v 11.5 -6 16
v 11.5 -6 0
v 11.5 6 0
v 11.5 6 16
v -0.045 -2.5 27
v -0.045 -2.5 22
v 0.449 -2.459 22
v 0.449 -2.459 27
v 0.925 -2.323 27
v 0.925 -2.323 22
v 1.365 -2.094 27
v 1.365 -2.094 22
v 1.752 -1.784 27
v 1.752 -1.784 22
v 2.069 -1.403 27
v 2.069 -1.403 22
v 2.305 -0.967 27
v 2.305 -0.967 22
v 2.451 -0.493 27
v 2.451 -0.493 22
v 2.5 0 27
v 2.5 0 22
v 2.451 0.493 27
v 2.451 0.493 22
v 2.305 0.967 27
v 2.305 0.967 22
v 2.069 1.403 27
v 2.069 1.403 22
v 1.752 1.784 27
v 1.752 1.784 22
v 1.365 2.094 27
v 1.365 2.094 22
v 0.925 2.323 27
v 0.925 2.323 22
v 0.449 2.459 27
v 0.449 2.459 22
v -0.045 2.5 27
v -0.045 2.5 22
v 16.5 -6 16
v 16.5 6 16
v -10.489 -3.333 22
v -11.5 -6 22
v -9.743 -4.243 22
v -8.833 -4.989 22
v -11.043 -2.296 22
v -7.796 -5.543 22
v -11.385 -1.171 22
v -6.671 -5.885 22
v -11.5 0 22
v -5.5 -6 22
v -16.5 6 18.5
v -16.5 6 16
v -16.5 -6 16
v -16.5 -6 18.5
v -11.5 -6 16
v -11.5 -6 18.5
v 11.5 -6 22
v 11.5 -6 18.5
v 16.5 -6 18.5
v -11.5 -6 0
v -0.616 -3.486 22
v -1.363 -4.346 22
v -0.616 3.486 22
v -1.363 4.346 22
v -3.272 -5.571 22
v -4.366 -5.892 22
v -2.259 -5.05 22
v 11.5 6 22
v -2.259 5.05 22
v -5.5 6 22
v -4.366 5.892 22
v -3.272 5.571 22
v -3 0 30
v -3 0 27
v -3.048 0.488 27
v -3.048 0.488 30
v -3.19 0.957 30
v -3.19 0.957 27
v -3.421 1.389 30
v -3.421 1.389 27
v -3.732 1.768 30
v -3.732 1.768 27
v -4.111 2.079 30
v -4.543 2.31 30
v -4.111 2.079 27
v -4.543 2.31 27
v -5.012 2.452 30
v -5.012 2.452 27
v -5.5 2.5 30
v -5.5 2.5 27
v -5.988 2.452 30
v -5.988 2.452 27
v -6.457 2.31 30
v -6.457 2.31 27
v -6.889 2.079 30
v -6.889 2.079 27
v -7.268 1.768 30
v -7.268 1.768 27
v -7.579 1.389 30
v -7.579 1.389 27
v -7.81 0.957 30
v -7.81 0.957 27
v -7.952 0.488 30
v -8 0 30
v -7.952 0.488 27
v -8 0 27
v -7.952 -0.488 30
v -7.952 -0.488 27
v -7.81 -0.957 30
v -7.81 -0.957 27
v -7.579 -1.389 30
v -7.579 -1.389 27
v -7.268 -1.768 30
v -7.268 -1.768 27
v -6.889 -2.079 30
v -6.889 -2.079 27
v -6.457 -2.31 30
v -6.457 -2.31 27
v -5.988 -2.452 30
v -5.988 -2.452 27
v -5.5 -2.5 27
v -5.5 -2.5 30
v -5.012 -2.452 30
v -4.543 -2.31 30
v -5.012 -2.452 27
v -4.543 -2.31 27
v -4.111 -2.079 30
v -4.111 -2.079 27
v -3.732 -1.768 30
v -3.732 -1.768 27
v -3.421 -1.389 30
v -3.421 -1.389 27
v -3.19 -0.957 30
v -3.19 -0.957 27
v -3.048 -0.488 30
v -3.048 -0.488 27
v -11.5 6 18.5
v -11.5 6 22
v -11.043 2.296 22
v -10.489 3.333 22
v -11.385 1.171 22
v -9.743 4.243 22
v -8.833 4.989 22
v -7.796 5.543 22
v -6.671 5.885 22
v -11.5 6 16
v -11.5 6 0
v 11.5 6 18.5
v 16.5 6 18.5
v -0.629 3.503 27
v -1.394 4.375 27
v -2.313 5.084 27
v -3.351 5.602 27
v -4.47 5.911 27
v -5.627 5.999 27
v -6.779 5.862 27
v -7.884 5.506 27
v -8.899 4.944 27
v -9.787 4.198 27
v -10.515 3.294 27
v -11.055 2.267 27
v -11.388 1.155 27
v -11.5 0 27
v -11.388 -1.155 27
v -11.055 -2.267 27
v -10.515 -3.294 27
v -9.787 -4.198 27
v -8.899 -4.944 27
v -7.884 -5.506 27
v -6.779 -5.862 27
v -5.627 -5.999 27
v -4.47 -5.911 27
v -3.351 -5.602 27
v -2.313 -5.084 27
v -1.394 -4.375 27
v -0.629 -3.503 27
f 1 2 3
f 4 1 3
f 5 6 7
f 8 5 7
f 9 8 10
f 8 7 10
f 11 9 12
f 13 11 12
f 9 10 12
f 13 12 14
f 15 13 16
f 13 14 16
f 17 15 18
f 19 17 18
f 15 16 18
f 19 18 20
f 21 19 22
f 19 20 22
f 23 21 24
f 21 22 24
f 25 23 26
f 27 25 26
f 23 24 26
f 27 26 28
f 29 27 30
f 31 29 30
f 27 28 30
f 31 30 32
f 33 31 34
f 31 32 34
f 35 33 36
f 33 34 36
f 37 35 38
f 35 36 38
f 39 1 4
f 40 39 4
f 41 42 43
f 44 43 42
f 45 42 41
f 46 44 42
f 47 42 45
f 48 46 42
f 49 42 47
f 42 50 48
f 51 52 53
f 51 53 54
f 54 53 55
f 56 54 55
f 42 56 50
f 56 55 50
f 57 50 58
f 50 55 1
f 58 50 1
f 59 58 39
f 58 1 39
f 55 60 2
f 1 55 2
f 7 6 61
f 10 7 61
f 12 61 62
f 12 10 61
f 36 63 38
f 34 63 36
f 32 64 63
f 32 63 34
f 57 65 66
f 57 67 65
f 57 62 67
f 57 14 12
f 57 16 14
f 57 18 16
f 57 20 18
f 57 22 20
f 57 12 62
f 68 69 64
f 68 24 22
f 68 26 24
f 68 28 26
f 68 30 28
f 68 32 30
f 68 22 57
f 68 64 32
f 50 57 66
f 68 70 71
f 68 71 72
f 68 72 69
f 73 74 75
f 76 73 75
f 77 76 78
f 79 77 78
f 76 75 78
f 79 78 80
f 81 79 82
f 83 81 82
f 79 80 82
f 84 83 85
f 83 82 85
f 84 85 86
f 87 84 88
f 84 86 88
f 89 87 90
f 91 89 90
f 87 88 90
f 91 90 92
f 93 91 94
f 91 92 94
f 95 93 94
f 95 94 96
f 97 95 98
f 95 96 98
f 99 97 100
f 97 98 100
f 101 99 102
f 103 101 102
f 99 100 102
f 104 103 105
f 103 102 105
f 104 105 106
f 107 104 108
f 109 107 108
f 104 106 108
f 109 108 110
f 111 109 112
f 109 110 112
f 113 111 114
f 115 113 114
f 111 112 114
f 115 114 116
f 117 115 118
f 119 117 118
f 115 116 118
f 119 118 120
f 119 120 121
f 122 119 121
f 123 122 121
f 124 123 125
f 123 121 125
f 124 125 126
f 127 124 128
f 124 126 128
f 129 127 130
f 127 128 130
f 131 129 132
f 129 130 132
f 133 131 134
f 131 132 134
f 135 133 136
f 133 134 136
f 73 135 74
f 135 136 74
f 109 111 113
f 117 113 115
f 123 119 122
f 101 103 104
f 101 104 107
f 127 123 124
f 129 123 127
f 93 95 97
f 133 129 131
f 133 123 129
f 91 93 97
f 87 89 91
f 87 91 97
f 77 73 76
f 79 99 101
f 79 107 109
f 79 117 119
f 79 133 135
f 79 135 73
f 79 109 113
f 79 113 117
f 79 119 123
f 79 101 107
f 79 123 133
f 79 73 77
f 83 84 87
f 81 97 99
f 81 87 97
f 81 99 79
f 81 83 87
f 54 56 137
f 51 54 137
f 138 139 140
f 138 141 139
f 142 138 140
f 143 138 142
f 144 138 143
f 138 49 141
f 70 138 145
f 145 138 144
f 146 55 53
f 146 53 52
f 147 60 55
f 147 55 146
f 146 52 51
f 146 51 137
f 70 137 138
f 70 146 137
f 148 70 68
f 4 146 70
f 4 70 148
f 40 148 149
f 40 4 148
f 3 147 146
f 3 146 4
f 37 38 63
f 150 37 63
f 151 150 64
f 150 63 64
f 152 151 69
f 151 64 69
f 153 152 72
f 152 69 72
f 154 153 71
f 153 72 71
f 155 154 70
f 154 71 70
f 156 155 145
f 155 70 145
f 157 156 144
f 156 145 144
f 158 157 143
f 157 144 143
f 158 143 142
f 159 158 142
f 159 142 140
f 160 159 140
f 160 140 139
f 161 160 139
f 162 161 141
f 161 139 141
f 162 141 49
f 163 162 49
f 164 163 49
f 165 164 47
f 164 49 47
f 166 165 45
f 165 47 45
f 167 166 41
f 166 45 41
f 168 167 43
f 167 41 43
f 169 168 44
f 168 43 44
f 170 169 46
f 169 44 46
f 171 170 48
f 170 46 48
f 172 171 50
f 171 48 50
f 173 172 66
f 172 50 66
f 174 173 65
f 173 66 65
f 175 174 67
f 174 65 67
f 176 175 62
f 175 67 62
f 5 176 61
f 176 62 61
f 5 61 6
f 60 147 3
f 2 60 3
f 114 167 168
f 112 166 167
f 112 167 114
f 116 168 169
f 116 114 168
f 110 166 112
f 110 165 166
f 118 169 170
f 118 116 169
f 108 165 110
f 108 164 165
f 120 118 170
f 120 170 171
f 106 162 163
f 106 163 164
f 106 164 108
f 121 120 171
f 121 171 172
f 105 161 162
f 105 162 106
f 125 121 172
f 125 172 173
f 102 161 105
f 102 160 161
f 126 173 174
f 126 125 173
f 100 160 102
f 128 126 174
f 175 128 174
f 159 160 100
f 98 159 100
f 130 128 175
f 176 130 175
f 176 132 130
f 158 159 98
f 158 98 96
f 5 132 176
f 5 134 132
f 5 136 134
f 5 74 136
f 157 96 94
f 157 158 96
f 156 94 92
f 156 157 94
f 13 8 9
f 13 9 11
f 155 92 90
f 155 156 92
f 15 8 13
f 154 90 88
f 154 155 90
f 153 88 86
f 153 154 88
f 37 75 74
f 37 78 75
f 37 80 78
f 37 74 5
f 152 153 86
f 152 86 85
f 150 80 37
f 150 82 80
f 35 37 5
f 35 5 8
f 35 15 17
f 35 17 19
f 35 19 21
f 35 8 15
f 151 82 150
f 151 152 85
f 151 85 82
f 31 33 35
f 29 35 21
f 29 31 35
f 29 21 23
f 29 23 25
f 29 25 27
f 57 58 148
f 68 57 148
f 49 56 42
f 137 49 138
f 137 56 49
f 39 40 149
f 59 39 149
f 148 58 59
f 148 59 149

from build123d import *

# Parameters (mm, degrees)
ESQUISSE1_W        = 23
ESQUISSE1_H        = 12
BOSS_EXTRU_1_DEPTH = 22
ESQUISSE2_R        = 2.5
ESQUISSE2_R_2      = 6
BOSS_EXTRU_2_DEPTH = 5
ESQUISSE3_R        = 2.5
BOSS_EXTRU_3_DEPTH = 3
ESQUISSE4_W        = 2.5
ESQUISSE4_H        = 12
BOSS_EXTRU_4_DEPTH = 5


with BuildPart() as part:
    # Esquisse1 → Boss.-Extru.1 (new body)
    with BuildSketch(Plane.XY):
        Rectangle(ESQUISSE1_W, ESQUISSE1_H)
    extrude(amount=BOSS_EXTRU_1_DEPTH)

    # Esquisse2 → Boss.-Extru.2 (add)
    with BuildSketch(Plane.XY.offset(22)):
        Circle(ESQUISSE2_R)
        with Locations((-5.5, 0)):
            Circle(ESQUISSE2_R_2)
    extrude(amount=BOSS_EXTRU_2_DEPTH)

    # Esquisse3 → Boss.-Extru.3 (add)
    with BuildSketch(Plane.XY.offset(27)):
        with Locations((-5.5, 0)):
            Circle(ESQUISSE3_R)
    extrude(amount=BOSS_EXTRU_3_DEPTH)

    # Esquisse4 → Boss.-Extru.4 (add)
    with BuildSketch(Plane.ZY.offset(11.5)):
        with Locations((17.25, 0)):
            Rectangle(ESQUISSE4_W, ESQUISSE4_H)
    boss_extru_4 = extrude(amount=BOSS_EXTRU_4_DEPTH)

    # Symétrie1: Boss.-Extru.4 across plane
    add(boss_extru_4.mirror(Plane(origin=(0, 0, 0), x_dir=(0, 0, 1), z_dir=(1, 0, 0))))


solid = part.part
